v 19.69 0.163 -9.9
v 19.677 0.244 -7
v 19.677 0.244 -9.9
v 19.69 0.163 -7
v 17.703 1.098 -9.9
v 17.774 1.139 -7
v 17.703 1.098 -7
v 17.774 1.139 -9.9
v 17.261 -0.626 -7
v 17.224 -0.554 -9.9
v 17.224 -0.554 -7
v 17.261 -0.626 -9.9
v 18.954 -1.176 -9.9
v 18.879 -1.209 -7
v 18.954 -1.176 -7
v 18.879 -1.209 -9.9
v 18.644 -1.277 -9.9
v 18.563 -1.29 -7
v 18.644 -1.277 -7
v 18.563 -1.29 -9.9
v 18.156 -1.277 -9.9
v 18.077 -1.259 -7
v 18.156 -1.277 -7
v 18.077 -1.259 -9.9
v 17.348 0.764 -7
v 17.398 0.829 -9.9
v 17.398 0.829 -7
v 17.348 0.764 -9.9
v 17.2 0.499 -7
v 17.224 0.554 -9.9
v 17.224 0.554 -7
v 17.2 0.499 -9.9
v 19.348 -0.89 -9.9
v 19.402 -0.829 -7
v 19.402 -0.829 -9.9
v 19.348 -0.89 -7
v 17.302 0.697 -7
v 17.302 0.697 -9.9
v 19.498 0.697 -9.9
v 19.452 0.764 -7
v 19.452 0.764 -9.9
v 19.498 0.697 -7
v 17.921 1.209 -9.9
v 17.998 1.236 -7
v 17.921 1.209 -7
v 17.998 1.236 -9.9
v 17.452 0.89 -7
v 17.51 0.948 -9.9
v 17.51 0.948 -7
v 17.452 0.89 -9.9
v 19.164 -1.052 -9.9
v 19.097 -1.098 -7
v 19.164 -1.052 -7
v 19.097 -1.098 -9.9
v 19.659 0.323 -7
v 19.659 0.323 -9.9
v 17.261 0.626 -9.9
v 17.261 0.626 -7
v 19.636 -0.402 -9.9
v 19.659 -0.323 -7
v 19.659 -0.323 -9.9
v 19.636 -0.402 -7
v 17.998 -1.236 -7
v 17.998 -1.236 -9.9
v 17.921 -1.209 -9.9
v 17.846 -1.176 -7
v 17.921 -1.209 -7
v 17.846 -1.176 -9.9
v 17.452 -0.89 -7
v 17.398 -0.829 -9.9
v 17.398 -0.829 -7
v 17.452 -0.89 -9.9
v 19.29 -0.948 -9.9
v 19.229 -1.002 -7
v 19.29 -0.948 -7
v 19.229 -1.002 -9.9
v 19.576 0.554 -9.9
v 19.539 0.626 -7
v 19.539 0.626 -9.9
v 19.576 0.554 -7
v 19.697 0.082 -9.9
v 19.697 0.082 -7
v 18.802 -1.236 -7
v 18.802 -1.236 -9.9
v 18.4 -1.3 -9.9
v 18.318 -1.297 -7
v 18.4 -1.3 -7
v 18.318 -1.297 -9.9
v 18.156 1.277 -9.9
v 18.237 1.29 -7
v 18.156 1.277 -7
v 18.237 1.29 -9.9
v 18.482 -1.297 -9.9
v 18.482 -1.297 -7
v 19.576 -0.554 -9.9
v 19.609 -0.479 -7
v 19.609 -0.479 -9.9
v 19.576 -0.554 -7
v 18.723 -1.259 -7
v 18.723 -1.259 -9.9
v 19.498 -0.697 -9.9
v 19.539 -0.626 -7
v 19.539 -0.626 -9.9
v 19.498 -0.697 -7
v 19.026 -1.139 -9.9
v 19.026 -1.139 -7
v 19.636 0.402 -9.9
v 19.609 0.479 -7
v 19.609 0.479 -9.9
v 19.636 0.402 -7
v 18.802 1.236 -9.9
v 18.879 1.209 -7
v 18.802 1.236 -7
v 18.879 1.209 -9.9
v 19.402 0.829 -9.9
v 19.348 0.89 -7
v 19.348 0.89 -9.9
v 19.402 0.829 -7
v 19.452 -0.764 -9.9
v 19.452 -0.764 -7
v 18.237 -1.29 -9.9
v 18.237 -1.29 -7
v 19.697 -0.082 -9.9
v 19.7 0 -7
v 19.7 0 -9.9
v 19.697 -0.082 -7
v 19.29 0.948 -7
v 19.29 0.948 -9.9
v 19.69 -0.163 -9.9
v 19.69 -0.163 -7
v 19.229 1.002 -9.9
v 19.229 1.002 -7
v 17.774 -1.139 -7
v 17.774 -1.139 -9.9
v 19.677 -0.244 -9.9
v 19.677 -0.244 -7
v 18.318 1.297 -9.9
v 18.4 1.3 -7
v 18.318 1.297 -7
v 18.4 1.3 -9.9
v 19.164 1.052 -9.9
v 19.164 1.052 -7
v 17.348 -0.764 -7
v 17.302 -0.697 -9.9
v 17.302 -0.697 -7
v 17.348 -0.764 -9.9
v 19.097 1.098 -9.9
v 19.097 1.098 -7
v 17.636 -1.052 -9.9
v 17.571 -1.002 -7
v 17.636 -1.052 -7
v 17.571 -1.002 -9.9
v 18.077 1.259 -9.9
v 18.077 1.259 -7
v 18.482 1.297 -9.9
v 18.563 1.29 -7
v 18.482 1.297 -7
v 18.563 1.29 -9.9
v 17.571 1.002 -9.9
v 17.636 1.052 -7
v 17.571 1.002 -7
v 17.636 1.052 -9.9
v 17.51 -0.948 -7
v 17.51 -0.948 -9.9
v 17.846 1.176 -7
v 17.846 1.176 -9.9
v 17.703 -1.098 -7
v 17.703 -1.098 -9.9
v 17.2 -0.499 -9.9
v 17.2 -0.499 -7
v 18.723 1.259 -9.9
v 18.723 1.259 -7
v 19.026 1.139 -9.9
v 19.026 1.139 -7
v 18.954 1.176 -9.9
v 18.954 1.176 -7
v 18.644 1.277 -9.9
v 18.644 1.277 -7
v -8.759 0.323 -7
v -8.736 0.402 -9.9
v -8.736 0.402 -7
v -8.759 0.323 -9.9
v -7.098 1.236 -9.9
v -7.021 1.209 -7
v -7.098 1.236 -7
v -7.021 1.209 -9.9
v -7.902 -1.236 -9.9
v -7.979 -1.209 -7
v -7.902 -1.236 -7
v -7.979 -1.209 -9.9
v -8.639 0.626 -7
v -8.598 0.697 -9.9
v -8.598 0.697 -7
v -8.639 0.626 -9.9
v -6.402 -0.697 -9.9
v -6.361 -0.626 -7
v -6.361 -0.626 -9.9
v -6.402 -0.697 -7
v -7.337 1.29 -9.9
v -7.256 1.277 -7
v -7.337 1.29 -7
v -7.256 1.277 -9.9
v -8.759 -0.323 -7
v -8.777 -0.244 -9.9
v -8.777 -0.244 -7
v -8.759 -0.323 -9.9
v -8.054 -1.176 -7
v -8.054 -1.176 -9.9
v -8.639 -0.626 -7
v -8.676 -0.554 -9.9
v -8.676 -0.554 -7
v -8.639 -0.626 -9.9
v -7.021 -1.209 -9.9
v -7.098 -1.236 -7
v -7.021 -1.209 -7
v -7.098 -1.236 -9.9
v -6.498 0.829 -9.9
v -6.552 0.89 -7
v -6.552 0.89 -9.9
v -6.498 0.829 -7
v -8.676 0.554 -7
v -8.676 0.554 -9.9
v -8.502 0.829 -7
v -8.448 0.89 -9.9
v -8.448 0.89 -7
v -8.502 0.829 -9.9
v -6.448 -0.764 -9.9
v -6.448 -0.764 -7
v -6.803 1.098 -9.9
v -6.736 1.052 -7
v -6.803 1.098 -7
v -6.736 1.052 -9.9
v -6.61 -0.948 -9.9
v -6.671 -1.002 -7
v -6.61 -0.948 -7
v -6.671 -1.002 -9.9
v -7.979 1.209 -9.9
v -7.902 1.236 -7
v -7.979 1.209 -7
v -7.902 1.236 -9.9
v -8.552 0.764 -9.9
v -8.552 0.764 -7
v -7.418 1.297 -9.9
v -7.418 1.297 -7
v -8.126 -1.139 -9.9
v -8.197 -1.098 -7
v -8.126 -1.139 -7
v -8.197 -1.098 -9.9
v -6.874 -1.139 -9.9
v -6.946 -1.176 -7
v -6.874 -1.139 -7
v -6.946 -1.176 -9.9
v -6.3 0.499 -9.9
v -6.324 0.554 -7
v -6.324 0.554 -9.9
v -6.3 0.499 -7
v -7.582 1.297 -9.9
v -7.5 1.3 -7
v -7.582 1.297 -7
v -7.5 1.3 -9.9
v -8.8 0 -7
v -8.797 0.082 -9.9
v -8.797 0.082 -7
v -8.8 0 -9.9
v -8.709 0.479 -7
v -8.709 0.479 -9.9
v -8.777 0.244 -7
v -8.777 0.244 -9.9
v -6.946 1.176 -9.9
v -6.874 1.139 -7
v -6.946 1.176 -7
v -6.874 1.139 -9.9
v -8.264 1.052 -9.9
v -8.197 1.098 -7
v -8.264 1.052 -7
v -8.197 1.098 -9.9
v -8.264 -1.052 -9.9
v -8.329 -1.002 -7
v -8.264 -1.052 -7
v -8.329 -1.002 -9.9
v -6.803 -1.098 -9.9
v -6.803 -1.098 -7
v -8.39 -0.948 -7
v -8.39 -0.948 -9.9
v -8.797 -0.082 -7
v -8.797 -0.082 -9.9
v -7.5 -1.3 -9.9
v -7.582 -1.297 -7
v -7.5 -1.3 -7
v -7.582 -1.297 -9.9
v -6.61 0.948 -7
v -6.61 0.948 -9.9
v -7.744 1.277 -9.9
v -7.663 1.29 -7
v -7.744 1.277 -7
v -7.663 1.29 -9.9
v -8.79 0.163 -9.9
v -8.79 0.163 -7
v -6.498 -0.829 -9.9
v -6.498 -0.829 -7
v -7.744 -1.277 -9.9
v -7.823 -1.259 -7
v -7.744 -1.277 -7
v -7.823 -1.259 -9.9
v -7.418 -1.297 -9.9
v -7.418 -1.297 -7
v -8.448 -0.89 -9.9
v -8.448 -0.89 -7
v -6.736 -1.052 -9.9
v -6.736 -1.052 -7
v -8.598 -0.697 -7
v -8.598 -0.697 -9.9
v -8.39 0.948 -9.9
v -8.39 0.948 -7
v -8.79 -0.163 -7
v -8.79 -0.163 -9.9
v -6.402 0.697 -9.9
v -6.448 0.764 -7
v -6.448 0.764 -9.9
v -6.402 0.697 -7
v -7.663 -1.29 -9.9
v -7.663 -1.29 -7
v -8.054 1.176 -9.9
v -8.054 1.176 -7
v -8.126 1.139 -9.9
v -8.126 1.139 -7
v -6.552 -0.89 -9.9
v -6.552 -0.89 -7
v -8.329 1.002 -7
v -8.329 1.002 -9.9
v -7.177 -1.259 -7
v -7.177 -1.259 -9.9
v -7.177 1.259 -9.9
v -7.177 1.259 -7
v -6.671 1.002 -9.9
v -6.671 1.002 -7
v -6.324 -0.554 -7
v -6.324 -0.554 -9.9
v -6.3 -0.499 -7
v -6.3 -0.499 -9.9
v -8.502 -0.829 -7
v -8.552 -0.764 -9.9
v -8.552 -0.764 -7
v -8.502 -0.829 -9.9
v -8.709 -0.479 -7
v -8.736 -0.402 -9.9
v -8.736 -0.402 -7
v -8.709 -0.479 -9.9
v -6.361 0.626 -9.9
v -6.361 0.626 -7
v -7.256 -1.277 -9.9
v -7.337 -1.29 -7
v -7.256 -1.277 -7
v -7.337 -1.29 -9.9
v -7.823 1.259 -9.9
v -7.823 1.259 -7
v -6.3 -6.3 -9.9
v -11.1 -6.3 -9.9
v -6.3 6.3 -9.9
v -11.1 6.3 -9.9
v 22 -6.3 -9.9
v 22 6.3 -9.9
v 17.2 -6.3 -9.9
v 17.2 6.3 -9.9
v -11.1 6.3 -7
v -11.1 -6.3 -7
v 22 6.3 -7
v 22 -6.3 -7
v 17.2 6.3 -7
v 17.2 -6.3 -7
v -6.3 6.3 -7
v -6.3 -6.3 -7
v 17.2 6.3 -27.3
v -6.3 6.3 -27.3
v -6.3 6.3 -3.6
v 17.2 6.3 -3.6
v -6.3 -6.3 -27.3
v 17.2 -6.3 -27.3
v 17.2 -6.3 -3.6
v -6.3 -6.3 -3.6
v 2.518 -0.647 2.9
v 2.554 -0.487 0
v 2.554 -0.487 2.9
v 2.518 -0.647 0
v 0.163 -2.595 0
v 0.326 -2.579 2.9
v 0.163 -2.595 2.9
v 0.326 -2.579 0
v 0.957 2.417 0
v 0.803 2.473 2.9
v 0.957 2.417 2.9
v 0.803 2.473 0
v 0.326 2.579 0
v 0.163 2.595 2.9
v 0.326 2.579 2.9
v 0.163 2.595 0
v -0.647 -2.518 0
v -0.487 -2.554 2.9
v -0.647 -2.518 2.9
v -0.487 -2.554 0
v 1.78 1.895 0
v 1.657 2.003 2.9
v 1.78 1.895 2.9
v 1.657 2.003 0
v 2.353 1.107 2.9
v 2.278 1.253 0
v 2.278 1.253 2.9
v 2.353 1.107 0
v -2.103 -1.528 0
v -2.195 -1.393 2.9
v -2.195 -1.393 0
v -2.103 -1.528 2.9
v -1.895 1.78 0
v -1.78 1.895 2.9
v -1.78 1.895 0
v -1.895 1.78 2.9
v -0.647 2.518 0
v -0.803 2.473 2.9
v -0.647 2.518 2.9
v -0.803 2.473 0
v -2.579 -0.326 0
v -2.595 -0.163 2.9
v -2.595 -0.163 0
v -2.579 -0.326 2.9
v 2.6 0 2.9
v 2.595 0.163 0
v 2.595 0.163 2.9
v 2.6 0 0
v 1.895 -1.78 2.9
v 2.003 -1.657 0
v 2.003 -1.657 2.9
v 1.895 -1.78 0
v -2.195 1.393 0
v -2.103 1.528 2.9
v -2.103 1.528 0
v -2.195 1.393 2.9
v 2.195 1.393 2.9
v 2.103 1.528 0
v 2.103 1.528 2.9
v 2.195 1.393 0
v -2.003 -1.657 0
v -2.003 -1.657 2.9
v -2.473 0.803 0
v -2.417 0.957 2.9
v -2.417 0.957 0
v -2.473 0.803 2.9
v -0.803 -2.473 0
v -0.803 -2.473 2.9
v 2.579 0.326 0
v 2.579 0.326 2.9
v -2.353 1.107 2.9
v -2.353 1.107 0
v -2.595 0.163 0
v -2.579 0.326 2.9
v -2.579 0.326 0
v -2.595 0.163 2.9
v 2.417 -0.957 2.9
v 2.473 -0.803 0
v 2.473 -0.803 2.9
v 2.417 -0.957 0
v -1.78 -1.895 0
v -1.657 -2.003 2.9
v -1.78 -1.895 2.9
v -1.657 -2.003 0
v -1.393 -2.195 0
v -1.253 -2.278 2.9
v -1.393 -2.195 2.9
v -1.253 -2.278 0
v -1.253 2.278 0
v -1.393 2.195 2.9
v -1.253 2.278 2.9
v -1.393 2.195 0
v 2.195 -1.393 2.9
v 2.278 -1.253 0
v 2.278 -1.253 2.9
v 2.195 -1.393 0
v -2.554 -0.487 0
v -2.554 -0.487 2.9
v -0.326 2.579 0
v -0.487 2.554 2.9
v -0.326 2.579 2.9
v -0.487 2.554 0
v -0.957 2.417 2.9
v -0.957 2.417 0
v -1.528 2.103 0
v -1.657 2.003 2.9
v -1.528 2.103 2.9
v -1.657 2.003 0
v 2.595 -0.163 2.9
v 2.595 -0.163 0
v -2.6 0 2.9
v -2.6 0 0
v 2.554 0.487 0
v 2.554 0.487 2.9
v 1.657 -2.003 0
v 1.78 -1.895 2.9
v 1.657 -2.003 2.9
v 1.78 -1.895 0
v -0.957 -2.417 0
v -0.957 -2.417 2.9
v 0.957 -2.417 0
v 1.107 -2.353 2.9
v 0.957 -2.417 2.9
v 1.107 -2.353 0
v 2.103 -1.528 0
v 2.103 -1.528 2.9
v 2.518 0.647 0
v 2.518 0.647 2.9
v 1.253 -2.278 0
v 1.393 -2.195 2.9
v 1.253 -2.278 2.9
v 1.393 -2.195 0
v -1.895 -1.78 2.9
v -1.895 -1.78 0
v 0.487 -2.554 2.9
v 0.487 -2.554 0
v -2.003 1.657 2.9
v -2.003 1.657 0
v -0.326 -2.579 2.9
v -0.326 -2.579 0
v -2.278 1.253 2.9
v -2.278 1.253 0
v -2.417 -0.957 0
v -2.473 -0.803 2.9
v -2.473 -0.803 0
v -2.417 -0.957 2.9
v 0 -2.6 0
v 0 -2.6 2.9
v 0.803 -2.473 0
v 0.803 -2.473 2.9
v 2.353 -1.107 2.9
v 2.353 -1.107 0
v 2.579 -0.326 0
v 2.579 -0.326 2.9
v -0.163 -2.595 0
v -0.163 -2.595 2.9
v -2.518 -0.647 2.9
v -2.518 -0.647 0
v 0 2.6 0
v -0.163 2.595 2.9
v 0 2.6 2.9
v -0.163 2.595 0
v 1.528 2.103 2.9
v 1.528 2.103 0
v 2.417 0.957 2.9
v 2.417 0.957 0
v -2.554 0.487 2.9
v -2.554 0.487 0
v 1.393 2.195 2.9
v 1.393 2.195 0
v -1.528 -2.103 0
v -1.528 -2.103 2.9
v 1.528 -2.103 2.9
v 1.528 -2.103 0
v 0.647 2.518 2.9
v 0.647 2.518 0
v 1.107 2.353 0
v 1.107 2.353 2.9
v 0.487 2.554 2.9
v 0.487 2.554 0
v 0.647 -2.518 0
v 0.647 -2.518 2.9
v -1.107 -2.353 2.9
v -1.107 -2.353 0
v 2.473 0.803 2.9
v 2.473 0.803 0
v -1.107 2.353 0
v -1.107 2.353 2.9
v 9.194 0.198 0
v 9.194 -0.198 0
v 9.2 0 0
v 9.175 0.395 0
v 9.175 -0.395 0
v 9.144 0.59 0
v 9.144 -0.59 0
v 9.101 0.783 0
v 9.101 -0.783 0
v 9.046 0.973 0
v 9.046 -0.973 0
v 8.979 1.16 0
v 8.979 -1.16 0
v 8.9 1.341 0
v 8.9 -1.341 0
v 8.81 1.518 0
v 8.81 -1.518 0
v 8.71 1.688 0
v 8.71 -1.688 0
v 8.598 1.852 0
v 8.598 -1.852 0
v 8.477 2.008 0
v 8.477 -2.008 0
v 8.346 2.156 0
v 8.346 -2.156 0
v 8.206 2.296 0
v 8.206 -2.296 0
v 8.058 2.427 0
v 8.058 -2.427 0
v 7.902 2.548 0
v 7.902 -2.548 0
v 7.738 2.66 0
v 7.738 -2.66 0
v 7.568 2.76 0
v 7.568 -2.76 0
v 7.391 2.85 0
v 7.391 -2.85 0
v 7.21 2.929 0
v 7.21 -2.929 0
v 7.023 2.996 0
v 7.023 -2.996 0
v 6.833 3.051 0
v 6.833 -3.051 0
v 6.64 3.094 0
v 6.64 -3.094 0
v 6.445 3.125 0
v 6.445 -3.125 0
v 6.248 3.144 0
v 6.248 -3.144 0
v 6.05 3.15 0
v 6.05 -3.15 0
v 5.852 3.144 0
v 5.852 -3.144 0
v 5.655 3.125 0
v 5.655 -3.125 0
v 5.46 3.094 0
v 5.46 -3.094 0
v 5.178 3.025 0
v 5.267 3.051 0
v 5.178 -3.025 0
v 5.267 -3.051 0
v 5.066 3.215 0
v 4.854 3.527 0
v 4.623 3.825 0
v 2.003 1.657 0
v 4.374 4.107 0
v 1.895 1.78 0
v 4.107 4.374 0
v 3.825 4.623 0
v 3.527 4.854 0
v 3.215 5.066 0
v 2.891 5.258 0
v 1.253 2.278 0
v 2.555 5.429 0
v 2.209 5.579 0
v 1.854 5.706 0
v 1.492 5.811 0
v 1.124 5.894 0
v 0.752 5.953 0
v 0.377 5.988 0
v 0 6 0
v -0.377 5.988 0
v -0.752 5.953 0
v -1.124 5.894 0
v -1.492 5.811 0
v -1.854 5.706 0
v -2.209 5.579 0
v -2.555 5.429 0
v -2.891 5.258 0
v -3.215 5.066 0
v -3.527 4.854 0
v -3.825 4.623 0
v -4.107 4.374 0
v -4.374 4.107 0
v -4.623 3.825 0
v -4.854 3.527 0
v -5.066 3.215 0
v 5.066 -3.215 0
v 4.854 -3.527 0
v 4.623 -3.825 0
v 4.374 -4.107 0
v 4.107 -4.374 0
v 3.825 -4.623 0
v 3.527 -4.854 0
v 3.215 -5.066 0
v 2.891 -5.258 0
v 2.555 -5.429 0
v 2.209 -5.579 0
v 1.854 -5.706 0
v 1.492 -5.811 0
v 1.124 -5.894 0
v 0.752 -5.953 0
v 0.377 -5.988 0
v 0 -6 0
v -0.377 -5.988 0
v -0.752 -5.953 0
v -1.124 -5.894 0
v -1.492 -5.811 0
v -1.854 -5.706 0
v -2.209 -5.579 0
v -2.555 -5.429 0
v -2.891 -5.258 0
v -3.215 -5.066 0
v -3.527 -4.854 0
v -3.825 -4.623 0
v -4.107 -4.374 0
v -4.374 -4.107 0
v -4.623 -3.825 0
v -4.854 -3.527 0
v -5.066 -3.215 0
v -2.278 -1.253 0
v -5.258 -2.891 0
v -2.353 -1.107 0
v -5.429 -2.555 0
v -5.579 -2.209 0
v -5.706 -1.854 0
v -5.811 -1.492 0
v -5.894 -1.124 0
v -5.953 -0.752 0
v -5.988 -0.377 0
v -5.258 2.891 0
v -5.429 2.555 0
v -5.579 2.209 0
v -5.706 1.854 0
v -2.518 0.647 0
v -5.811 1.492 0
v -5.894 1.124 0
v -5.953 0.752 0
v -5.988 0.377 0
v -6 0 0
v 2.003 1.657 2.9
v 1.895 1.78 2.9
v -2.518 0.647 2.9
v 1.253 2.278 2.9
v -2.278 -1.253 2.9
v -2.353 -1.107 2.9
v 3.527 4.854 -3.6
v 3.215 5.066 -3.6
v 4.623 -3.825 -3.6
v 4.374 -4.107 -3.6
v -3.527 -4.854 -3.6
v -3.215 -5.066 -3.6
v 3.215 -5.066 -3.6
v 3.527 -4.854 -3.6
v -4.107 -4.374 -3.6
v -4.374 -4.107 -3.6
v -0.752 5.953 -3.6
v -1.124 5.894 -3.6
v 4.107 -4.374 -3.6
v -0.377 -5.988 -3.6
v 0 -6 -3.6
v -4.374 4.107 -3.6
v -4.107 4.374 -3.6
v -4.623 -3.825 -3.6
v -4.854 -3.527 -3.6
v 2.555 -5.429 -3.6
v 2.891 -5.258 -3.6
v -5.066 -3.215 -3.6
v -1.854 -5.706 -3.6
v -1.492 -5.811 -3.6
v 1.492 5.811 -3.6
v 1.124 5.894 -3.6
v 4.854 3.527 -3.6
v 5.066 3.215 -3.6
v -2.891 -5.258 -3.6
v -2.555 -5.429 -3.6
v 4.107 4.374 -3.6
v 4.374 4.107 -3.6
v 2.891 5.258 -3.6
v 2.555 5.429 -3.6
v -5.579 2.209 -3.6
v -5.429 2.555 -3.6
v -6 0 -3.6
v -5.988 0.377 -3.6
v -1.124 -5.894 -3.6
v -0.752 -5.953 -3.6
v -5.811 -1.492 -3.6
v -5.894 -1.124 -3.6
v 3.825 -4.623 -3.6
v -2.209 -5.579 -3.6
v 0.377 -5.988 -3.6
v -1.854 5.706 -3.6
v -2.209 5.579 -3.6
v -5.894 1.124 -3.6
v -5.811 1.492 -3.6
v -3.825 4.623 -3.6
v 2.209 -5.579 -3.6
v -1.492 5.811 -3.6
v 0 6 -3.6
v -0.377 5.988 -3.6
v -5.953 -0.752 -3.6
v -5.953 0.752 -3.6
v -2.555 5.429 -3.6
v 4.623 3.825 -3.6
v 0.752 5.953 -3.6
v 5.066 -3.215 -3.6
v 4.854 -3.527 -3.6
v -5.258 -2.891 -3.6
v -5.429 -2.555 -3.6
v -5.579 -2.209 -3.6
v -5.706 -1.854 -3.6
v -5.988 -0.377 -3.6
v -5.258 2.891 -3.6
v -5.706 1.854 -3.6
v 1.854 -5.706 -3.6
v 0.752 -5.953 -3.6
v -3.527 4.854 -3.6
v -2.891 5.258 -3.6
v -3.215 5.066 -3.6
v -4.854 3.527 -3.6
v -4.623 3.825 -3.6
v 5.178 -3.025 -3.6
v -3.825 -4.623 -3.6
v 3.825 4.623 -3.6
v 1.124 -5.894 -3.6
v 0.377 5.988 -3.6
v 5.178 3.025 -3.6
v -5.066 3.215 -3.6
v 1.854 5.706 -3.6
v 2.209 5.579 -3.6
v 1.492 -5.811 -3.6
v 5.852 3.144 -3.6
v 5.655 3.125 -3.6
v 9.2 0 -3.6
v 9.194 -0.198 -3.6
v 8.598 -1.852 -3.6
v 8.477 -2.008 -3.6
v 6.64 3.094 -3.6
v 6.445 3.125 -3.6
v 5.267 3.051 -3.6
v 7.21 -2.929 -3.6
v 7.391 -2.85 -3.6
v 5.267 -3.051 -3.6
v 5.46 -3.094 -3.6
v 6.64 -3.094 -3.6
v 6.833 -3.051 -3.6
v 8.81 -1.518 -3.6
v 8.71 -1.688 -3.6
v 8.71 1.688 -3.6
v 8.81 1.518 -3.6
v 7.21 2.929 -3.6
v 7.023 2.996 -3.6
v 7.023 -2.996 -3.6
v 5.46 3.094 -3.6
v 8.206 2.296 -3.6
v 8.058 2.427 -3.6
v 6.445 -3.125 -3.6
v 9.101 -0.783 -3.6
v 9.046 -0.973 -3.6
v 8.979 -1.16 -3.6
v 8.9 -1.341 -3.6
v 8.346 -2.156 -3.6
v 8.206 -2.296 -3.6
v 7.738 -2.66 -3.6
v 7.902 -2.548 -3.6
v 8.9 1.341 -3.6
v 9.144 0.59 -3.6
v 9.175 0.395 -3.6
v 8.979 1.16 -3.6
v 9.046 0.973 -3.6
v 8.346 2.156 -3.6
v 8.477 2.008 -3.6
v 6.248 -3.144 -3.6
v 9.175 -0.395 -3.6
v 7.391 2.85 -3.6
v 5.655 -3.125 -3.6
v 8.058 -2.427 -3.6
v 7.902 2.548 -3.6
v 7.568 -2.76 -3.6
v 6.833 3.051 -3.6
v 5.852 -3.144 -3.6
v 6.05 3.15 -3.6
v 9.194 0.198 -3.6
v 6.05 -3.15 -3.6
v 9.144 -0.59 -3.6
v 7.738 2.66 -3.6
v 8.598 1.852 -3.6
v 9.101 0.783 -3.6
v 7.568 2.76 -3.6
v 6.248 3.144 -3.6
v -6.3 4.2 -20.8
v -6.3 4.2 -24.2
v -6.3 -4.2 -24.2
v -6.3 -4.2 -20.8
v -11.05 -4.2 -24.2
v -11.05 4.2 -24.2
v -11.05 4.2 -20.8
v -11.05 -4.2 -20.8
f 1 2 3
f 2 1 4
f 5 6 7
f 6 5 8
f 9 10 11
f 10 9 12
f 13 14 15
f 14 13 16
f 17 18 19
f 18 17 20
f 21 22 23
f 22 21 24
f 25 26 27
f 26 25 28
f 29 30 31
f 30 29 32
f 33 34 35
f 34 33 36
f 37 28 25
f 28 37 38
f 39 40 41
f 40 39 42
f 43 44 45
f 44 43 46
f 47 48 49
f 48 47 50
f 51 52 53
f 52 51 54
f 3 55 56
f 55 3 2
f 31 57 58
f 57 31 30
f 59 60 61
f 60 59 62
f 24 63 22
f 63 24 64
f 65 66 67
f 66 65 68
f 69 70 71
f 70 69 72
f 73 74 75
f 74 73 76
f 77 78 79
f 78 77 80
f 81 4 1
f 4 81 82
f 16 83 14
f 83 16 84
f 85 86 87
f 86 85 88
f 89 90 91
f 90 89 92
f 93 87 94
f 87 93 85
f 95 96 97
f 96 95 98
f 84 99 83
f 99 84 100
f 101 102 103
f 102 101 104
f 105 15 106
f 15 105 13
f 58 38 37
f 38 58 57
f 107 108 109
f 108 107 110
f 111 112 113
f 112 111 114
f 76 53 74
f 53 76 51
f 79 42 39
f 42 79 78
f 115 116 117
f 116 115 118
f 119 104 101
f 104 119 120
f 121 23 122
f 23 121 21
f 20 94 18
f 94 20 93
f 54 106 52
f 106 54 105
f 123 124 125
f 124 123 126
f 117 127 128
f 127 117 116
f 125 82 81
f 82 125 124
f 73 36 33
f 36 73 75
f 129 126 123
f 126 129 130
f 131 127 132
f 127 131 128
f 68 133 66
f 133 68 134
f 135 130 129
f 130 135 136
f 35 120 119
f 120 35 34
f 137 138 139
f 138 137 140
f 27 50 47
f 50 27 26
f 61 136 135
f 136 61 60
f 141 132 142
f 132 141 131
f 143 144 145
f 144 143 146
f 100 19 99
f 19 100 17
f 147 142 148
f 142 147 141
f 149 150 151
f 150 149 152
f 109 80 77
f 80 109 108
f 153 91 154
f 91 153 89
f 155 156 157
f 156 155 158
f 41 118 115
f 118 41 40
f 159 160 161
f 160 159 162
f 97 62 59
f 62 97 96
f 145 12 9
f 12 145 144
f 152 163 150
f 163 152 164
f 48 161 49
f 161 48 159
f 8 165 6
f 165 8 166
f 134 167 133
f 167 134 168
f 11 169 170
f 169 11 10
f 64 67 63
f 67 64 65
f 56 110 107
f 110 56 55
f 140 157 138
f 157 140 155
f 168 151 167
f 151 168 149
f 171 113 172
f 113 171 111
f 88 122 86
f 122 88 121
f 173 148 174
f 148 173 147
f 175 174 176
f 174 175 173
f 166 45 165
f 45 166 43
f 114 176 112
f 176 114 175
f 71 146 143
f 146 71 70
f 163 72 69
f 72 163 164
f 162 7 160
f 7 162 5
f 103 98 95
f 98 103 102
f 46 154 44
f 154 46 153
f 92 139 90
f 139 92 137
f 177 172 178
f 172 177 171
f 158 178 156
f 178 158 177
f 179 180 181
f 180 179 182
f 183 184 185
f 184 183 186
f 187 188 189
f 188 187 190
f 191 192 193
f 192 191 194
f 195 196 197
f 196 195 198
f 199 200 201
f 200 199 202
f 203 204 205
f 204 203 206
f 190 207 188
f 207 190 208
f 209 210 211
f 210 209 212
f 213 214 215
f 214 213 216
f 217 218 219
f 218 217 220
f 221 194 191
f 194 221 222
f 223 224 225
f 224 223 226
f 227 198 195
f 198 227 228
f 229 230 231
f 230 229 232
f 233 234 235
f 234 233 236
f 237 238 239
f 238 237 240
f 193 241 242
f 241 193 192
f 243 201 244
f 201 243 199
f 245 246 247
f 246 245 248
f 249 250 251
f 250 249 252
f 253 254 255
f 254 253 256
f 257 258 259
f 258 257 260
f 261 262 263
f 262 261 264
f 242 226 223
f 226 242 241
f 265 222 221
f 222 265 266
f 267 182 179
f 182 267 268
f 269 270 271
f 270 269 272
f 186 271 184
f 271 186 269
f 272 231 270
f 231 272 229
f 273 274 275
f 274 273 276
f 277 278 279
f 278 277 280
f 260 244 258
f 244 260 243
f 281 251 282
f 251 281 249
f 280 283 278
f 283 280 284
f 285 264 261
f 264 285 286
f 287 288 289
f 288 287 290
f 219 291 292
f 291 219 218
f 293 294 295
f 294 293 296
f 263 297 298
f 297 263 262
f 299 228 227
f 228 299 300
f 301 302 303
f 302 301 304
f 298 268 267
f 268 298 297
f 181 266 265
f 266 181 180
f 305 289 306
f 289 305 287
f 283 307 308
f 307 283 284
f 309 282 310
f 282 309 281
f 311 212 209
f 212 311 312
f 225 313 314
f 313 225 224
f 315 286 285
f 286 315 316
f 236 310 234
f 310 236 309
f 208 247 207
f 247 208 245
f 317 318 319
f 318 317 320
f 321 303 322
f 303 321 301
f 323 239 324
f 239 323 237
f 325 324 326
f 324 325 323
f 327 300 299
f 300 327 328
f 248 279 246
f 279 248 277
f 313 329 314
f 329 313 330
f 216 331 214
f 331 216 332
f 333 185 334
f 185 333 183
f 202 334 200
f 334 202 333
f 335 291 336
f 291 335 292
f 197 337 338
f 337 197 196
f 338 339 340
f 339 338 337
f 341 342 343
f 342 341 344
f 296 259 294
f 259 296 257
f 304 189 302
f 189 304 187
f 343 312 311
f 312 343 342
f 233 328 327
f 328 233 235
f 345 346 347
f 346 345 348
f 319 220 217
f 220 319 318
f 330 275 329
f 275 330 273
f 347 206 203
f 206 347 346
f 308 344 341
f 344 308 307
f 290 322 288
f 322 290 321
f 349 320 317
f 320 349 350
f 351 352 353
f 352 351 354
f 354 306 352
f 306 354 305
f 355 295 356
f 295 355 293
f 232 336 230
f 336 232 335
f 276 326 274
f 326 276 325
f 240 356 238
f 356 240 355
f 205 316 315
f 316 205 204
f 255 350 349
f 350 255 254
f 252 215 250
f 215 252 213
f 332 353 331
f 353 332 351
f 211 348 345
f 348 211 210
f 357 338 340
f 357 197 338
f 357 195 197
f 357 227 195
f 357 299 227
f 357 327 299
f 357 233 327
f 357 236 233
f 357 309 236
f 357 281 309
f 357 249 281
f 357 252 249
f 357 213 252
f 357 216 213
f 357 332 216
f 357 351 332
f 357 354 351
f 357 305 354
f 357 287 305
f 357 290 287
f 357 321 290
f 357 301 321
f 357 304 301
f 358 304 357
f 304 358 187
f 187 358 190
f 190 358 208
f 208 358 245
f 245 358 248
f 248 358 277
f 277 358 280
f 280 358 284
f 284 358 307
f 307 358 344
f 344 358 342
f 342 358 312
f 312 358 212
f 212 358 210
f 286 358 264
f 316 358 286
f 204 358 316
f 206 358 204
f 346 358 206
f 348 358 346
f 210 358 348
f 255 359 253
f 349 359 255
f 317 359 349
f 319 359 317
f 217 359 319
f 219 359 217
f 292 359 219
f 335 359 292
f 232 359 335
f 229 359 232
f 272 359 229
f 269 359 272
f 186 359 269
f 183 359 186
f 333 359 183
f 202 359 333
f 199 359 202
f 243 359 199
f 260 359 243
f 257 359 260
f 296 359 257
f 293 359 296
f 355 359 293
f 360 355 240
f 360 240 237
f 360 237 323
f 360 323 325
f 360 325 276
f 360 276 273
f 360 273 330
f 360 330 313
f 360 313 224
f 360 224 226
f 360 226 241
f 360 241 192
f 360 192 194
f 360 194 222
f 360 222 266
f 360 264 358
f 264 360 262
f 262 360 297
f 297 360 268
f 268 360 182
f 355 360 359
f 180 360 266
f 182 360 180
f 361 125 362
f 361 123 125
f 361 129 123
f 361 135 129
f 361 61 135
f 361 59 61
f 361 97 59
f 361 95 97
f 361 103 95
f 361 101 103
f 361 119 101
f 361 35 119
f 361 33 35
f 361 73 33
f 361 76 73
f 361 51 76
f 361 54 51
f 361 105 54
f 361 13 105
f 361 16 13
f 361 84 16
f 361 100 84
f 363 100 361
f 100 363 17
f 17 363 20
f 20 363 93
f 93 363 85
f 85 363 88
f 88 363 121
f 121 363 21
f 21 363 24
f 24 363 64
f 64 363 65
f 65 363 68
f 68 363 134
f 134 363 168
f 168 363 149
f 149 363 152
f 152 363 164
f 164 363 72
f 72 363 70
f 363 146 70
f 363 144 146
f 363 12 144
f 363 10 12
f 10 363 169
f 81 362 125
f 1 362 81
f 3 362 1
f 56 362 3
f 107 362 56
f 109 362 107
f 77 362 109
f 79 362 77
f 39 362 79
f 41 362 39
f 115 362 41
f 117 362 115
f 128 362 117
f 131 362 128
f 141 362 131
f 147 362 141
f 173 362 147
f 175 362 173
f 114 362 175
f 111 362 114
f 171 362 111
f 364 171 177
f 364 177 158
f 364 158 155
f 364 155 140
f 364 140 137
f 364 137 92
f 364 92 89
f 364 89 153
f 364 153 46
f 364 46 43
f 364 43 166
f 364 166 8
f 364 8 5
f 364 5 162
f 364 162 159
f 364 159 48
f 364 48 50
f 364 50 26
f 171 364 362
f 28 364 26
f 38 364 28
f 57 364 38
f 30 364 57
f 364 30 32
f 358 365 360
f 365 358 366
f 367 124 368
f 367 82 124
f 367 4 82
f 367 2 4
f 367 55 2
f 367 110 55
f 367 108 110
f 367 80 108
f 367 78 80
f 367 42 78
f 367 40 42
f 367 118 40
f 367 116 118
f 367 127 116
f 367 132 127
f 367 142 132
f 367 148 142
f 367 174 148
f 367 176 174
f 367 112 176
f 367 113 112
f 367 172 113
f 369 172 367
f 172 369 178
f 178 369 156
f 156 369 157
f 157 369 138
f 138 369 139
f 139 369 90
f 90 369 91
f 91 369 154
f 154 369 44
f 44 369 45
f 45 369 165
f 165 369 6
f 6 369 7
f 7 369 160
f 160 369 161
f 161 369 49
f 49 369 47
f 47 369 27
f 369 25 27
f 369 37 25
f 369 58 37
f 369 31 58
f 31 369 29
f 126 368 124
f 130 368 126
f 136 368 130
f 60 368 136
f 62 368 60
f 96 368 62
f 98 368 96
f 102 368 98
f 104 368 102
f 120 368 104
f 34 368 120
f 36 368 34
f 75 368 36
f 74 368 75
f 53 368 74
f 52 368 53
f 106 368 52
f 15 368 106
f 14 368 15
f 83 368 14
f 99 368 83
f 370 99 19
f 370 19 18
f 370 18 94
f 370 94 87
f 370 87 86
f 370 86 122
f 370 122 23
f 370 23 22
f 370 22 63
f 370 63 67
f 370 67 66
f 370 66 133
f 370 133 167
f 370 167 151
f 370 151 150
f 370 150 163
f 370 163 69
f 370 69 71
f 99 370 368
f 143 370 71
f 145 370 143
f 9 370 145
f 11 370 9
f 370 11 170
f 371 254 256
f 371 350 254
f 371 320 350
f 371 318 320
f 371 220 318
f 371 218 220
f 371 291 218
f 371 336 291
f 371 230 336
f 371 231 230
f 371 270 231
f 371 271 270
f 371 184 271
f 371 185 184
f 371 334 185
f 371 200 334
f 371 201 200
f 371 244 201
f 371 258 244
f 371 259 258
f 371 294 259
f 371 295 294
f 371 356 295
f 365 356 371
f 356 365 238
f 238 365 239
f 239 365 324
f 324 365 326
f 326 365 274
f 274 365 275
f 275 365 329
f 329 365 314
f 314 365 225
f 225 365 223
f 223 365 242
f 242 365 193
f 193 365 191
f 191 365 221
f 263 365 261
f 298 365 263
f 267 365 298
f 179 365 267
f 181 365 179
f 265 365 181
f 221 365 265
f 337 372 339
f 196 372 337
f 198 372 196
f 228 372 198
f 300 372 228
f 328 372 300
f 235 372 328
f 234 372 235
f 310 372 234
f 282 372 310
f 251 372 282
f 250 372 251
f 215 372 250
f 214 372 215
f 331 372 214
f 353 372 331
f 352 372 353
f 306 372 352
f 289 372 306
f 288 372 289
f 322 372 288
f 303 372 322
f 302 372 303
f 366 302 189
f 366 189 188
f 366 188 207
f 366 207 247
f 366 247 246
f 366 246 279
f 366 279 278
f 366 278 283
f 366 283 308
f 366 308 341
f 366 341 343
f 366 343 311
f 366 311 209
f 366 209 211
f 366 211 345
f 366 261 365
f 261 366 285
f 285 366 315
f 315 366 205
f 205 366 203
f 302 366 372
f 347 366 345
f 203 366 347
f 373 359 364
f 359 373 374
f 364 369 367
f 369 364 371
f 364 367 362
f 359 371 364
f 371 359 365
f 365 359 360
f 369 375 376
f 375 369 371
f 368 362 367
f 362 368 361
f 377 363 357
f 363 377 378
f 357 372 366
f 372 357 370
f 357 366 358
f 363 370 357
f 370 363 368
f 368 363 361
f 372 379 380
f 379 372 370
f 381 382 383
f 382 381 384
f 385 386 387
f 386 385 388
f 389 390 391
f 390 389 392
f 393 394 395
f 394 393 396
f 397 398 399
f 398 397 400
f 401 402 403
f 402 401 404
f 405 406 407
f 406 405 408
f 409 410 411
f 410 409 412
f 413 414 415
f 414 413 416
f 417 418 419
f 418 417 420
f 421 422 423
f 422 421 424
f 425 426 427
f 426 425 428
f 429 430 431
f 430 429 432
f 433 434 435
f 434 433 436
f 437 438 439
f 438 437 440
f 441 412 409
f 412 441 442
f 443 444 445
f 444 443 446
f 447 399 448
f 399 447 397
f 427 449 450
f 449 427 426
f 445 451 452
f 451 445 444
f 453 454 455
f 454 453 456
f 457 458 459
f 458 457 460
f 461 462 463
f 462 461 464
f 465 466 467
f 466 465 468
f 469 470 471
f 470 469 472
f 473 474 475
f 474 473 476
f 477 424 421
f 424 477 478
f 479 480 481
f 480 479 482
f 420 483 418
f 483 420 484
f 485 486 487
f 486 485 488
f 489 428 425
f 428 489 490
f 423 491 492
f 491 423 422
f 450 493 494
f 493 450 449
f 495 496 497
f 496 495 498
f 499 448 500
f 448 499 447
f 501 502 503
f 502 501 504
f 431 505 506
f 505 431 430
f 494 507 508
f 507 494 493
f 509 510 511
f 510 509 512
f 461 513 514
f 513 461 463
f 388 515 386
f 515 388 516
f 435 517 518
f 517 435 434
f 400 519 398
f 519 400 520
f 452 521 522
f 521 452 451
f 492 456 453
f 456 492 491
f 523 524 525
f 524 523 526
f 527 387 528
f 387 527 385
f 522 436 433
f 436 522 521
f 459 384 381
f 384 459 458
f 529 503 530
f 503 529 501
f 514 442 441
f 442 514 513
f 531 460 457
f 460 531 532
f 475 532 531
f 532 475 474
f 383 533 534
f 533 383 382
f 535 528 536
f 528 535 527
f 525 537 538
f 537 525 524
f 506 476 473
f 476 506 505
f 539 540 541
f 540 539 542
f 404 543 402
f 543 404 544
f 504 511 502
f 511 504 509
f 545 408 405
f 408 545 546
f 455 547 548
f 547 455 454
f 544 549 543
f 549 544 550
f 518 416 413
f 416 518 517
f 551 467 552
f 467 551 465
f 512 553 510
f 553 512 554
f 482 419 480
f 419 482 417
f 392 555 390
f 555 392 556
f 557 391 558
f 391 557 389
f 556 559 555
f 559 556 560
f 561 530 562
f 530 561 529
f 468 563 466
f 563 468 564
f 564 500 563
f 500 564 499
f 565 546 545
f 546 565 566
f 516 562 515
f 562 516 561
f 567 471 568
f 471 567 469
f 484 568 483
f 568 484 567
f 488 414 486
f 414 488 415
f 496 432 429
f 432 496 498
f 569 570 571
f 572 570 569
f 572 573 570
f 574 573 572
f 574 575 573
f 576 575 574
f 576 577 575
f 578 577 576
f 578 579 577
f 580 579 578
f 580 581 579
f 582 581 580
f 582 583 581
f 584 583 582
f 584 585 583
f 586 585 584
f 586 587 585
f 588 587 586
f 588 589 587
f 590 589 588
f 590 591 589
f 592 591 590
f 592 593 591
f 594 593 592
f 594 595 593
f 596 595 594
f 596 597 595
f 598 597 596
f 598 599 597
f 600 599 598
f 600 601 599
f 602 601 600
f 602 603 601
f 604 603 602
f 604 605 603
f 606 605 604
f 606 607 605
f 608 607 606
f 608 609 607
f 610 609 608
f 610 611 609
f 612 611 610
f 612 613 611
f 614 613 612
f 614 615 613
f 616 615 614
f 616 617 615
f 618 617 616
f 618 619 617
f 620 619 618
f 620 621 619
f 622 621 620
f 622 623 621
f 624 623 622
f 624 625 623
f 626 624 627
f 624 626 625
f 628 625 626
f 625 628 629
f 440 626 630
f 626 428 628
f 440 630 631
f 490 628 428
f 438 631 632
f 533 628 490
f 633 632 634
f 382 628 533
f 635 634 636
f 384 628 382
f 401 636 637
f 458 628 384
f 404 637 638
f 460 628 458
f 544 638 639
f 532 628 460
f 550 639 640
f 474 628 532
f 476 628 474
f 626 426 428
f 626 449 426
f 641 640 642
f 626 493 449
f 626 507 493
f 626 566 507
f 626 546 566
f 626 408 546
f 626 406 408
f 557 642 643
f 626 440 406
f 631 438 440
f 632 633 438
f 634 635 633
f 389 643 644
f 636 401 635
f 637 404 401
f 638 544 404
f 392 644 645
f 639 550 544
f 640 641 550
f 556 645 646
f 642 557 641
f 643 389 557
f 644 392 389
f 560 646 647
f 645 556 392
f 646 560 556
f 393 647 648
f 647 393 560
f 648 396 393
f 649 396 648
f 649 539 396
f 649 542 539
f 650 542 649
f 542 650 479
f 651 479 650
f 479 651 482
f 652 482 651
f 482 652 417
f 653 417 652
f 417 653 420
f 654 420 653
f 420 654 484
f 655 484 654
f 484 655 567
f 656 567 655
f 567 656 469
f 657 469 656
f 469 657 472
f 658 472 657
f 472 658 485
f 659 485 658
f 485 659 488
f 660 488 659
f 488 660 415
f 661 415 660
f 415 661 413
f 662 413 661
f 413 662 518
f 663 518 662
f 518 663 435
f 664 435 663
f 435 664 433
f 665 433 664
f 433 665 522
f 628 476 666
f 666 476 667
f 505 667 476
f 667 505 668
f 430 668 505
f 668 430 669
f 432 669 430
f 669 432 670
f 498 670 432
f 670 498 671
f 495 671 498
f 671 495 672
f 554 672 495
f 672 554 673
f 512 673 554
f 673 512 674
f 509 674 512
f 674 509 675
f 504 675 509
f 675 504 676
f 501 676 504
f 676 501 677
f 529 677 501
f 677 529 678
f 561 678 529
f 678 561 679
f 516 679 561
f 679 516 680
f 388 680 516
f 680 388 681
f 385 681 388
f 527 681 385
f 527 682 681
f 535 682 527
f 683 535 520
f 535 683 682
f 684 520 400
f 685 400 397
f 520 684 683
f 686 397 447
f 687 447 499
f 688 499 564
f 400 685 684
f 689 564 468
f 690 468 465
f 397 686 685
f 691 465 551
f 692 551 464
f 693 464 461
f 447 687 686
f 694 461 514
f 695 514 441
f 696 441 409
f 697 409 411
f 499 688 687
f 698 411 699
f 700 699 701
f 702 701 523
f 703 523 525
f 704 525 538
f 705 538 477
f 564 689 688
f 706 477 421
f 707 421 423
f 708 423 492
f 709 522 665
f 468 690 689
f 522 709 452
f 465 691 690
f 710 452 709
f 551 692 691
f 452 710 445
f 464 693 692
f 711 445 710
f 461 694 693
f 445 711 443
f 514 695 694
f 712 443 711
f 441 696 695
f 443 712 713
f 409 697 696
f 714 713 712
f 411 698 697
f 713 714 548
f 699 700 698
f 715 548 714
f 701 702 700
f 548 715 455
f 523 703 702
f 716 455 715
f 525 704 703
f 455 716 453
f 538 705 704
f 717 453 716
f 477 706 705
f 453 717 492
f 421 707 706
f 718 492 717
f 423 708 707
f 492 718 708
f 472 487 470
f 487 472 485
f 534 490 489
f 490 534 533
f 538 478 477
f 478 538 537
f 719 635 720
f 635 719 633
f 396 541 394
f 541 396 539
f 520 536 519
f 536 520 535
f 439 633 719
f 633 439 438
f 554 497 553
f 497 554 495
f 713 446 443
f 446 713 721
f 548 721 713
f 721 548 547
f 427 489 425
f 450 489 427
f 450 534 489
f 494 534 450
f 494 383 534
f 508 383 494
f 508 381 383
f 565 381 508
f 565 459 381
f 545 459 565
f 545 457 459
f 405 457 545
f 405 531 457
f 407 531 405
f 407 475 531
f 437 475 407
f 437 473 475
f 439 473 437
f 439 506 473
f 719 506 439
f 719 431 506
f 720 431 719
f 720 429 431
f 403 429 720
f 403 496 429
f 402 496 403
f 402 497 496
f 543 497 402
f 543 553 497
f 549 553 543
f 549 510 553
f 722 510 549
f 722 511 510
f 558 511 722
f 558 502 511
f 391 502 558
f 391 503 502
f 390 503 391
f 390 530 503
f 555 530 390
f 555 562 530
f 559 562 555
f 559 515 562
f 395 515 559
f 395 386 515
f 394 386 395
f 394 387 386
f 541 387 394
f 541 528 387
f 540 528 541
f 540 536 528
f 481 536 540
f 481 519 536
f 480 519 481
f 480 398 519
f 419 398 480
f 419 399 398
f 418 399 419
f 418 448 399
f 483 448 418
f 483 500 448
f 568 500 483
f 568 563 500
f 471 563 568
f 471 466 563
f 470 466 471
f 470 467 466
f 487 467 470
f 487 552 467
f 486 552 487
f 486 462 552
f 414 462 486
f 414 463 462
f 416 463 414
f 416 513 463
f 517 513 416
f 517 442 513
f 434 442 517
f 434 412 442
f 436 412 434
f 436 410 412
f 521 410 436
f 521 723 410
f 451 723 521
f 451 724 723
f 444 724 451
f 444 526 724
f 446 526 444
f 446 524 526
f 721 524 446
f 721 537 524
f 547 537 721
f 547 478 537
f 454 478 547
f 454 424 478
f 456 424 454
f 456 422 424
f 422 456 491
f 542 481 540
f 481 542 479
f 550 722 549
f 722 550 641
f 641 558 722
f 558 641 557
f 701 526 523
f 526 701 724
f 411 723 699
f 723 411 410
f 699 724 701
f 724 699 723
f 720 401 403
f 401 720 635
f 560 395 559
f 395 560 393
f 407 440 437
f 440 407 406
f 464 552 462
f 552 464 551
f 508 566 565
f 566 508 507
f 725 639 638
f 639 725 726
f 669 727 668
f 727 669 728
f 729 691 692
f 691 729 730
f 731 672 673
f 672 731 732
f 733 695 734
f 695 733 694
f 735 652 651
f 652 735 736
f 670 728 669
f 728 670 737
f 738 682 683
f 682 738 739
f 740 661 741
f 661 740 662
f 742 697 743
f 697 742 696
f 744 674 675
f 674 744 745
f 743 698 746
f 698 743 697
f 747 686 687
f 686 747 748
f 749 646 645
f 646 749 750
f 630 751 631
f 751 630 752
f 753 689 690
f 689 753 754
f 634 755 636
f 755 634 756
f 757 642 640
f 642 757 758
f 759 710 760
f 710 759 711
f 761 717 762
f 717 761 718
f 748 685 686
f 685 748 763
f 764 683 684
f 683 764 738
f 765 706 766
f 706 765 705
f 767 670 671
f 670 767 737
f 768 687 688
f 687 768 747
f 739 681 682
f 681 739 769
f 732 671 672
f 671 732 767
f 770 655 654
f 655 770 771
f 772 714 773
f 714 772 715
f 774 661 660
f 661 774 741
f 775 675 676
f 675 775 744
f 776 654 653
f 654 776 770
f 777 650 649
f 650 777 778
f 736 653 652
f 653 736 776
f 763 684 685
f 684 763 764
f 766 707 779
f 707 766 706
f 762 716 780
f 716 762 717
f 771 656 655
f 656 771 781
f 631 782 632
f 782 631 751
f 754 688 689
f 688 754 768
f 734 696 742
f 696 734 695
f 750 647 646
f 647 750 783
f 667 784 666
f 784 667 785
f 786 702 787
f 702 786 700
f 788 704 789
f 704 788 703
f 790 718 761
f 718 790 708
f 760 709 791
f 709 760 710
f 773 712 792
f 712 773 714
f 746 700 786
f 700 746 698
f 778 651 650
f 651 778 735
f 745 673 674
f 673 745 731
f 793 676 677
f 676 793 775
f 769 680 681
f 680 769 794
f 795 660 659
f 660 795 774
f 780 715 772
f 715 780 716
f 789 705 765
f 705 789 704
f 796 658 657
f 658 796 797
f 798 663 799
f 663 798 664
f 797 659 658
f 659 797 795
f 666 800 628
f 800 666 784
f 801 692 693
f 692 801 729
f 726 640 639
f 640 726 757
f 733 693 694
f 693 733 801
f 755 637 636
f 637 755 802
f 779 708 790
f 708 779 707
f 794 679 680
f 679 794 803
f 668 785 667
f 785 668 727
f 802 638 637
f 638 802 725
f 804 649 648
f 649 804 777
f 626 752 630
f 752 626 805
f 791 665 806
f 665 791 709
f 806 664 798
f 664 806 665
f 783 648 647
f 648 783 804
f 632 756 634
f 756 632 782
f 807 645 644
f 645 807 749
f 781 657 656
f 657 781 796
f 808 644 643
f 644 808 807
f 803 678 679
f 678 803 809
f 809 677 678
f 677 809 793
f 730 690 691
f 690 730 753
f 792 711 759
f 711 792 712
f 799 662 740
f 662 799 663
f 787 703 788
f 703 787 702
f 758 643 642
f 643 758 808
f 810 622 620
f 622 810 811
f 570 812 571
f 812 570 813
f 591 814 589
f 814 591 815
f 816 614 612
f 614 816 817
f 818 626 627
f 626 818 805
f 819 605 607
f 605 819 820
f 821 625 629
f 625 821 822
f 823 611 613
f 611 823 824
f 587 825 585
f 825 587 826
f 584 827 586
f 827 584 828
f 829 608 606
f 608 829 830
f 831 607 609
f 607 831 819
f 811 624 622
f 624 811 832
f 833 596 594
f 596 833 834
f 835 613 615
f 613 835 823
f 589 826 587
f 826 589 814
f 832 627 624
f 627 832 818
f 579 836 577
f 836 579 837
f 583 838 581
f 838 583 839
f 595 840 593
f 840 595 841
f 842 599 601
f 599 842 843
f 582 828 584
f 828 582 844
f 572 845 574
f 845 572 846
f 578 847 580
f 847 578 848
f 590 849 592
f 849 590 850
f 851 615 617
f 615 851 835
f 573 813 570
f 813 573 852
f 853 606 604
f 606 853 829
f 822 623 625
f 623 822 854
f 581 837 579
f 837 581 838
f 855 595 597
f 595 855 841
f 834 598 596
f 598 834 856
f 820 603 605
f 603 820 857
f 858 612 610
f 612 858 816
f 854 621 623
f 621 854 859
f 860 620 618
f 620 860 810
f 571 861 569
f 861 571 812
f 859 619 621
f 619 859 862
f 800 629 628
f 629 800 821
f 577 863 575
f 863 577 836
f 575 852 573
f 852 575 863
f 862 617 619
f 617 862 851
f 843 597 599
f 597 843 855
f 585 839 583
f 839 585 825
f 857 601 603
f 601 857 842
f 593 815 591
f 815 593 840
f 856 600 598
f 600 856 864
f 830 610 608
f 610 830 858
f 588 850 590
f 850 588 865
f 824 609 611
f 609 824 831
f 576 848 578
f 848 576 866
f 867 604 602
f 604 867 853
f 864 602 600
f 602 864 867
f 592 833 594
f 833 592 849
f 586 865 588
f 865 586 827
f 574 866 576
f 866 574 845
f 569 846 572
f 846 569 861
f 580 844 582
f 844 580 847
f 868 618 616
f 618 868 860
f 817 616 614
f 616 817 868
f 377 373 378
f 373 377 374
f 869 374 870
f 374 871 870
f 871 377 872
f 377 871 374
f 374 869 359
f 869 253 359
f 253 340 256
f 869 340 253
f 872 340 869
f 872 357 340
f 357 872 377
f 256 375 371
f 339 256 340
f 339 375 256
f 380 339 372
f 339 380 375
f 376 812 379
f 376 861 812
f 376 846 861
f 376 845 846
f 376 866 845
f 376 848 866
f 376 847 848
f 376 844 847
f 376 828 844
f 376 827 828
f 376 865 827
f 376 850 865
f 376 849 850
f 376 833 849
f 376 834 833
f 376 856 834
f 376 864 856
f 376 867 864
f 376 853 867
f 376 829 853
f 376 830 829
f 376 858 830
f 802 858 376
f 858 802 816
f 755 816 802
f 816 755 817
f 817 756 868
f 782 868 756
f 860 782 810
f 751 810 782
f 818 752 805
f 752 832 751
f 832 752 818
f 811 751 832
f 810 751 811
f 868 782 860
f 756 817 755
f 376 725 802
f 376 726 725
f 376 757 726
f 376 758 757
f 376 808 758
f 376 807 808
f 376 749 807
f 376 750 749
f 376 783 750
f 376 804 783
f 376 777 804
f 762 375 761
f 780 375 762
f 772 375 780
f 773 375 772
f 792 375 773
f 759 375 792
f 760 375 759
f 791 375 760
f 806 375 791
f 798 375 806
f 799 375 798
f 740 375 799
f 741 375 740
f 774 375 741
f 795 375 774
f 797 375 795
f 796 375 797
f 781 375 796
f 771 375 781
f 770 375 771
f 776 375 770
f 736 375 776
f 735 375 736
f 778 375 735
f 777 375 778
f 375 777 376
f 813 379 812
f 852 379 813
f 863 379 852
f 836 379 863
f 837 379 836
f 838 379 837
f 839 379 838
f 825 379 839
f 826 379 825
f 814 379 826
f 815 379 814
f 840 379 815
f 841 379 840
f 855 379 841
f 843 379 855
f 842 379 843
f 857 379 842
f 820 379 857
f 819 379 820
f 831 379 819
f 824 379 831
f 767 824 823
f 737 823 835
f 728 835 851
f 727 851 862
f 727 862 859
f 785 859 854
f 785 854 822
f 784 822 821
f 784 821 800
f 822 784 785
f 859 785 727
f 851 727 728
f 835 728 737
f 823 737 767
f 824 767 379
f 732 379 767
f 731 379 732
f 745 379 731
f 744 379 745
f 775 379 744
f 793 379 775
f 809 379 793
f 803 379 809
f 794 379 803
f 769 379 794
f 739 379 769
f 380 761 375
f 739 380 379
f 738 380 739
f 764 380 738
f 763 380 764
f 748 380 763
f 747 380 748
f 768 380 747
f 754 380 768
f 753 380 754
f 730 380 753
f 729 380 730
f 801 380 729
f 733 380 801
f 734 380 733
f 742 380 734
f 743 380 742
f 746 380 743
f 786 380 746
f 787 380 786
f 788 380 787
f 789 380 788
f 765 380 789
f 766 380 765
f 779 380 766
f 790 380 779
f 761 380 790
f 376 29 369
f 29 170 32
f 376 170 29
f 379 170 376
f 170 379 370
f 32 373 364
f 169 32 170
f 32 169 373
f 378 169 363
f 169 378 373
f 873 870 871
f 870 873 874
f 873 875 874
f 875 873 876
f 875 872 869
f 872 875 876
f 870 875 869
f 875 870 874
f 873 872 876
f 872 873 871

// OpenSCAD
$fn=100;
// maybe for the allowance do a +- on the number and sum the parts that result?

module servo_9g(allowance=0,pins=0,horn=0,cable_exit_len=5){
    servo_horn_height=6;
    drive_shaft = 4.7;
    drive_shaft_round = 11.5;
    drive_shaft_round_inset = 15.1-14.8;
    drive_shaft_round_2 = 5.8;
    drive_shaft_round_plus_round_2 = 14.7;
    
    height_with_drive_shaft = 30.2;
    height_with_drive_shaft_round = 27.3;
    height_main_body = 23.2;
    depth_main_body = 12.1;
    width_main_body = 23;
     
    flange_thickness = 2.4;
    width_with_flange = 32.6;
    flange_height = 19.8;
    flange_mount_hole_distance = 25.9;
    flange_mount_hole_diameter = 2.1;

    // cable exit is big enough for connector
    cable_exit_height = 6;
    cable_exit_width = 7.9;
    cable_exit_thickness = 2.9; // *2 for the allowance taken up by height
    module servo_part(allowance){
        if(horn>0){
            linear_extrude(servo_horn_height)circle(d=max(horn,drive_shaft+allowance));
        }
        else{
            linear_extrude(height_with_drive_shaft-height_with_drive_shaft_round)circle(d=max(drive_shaft+allowance));
        }
        translate([0,0,-(height_with_drive_shaft_round-height_main_body)])linear_extrude(height_with_drive_shaft_round-height_main_body)circle(d=drive_shaft_round+allowance);
        translate([drive_shaft_round_plus_round_2-drive_shaft_round/2-drive_shaft_round_2/2,0,-(height_with_drive_shaft_round-height_main_body)])linear_extrude(height_with_drive_shaft_round-height_main_body)circle(d=drive_shaft_round_2+allowance);
        translate([width_main_body/2-drive_shaft_round/2-drive_shaft_round_inset,0,-height_with_drive_shaft_round])linear_extrude(height_main_body+allowance)square([width_main_body+allowance,depth_main_body+allowance],center=true);
        translate([width_main_body/2-drive_shaft_round/2-drive_shaft_round_inset,0,-height_with_drive_shaft_round+flange_height-flange_thickness])
        {
            difference(){
                linear_extrude(flange_thickness+allowance)square([width_with_flange+allowance,depth_main_body+allowance],center=true);
                union(){
                    translate([flange_mount_hole_distance/2,0,-.0005])linear_extrude(flange_thickness+.001+allowance)circle(d=flange_mount_hole_diameter+allowance);
                    translate([-flange_mount_hole_distance/2,0,-.0005])linear_extrude(flange_thickness+.001+allowance)circle(d=flange_mount_hole_diameter+allowance);
                }
            }
            if(pins!=0){
                color("red",.2)translate([flange_mount_hole_distance/2,0,-.0005-max(0,pins)])linear_extrude(flange_thickness+.001+allowance+abs(pins))circle(d=flange_mount_hole_diameter);
                color("red",.2)translate([-flange_mount_hole_distance/2,0,-.0005-max(0,pins)])linear_extrude(flange_thickness+.001+allowance+abs(pins))circle(d=flange_mount_hole_diameter);
            }
        }
            
    translate([-cable_exit_len/2-drive_shaft_round/2-drive_shaft_round_inset,0,-height_with_drive_shaft_round+cable_exit_height-cable_exit_thickness])linear_extrude(cable_exit_thickness+allowance)square([cable_exit_len,cable_exit_width+allowance],center=true);
    }
    servo_part(allowance);
    // servo_part(-1*allowance);
}


module gears_p5M(){
    // 0.5Mod Gear 13T-27T for HOBBYWING Motors
    bore_diameter = 3.175;
    height = 7;
    rad_per_t = 1.65888;
    diameter_13T = 6.2;
    diameter_14T = 7.6;
    diameter_15T = 8.3;
    diameter_16T = 8.6;
    diameter_17T = 9.3;
    diameter_18T = 9.6;
    diameter_19T = 9.6;
    // diameter
    diameter_21T = 11.1;
    diameter_22T = 11.6;
    diameter_25T = 13.2;
    diameter_26T = 13.7;
    diameter_27T = 14.2;
}


servo_9g(allowance=.5);
